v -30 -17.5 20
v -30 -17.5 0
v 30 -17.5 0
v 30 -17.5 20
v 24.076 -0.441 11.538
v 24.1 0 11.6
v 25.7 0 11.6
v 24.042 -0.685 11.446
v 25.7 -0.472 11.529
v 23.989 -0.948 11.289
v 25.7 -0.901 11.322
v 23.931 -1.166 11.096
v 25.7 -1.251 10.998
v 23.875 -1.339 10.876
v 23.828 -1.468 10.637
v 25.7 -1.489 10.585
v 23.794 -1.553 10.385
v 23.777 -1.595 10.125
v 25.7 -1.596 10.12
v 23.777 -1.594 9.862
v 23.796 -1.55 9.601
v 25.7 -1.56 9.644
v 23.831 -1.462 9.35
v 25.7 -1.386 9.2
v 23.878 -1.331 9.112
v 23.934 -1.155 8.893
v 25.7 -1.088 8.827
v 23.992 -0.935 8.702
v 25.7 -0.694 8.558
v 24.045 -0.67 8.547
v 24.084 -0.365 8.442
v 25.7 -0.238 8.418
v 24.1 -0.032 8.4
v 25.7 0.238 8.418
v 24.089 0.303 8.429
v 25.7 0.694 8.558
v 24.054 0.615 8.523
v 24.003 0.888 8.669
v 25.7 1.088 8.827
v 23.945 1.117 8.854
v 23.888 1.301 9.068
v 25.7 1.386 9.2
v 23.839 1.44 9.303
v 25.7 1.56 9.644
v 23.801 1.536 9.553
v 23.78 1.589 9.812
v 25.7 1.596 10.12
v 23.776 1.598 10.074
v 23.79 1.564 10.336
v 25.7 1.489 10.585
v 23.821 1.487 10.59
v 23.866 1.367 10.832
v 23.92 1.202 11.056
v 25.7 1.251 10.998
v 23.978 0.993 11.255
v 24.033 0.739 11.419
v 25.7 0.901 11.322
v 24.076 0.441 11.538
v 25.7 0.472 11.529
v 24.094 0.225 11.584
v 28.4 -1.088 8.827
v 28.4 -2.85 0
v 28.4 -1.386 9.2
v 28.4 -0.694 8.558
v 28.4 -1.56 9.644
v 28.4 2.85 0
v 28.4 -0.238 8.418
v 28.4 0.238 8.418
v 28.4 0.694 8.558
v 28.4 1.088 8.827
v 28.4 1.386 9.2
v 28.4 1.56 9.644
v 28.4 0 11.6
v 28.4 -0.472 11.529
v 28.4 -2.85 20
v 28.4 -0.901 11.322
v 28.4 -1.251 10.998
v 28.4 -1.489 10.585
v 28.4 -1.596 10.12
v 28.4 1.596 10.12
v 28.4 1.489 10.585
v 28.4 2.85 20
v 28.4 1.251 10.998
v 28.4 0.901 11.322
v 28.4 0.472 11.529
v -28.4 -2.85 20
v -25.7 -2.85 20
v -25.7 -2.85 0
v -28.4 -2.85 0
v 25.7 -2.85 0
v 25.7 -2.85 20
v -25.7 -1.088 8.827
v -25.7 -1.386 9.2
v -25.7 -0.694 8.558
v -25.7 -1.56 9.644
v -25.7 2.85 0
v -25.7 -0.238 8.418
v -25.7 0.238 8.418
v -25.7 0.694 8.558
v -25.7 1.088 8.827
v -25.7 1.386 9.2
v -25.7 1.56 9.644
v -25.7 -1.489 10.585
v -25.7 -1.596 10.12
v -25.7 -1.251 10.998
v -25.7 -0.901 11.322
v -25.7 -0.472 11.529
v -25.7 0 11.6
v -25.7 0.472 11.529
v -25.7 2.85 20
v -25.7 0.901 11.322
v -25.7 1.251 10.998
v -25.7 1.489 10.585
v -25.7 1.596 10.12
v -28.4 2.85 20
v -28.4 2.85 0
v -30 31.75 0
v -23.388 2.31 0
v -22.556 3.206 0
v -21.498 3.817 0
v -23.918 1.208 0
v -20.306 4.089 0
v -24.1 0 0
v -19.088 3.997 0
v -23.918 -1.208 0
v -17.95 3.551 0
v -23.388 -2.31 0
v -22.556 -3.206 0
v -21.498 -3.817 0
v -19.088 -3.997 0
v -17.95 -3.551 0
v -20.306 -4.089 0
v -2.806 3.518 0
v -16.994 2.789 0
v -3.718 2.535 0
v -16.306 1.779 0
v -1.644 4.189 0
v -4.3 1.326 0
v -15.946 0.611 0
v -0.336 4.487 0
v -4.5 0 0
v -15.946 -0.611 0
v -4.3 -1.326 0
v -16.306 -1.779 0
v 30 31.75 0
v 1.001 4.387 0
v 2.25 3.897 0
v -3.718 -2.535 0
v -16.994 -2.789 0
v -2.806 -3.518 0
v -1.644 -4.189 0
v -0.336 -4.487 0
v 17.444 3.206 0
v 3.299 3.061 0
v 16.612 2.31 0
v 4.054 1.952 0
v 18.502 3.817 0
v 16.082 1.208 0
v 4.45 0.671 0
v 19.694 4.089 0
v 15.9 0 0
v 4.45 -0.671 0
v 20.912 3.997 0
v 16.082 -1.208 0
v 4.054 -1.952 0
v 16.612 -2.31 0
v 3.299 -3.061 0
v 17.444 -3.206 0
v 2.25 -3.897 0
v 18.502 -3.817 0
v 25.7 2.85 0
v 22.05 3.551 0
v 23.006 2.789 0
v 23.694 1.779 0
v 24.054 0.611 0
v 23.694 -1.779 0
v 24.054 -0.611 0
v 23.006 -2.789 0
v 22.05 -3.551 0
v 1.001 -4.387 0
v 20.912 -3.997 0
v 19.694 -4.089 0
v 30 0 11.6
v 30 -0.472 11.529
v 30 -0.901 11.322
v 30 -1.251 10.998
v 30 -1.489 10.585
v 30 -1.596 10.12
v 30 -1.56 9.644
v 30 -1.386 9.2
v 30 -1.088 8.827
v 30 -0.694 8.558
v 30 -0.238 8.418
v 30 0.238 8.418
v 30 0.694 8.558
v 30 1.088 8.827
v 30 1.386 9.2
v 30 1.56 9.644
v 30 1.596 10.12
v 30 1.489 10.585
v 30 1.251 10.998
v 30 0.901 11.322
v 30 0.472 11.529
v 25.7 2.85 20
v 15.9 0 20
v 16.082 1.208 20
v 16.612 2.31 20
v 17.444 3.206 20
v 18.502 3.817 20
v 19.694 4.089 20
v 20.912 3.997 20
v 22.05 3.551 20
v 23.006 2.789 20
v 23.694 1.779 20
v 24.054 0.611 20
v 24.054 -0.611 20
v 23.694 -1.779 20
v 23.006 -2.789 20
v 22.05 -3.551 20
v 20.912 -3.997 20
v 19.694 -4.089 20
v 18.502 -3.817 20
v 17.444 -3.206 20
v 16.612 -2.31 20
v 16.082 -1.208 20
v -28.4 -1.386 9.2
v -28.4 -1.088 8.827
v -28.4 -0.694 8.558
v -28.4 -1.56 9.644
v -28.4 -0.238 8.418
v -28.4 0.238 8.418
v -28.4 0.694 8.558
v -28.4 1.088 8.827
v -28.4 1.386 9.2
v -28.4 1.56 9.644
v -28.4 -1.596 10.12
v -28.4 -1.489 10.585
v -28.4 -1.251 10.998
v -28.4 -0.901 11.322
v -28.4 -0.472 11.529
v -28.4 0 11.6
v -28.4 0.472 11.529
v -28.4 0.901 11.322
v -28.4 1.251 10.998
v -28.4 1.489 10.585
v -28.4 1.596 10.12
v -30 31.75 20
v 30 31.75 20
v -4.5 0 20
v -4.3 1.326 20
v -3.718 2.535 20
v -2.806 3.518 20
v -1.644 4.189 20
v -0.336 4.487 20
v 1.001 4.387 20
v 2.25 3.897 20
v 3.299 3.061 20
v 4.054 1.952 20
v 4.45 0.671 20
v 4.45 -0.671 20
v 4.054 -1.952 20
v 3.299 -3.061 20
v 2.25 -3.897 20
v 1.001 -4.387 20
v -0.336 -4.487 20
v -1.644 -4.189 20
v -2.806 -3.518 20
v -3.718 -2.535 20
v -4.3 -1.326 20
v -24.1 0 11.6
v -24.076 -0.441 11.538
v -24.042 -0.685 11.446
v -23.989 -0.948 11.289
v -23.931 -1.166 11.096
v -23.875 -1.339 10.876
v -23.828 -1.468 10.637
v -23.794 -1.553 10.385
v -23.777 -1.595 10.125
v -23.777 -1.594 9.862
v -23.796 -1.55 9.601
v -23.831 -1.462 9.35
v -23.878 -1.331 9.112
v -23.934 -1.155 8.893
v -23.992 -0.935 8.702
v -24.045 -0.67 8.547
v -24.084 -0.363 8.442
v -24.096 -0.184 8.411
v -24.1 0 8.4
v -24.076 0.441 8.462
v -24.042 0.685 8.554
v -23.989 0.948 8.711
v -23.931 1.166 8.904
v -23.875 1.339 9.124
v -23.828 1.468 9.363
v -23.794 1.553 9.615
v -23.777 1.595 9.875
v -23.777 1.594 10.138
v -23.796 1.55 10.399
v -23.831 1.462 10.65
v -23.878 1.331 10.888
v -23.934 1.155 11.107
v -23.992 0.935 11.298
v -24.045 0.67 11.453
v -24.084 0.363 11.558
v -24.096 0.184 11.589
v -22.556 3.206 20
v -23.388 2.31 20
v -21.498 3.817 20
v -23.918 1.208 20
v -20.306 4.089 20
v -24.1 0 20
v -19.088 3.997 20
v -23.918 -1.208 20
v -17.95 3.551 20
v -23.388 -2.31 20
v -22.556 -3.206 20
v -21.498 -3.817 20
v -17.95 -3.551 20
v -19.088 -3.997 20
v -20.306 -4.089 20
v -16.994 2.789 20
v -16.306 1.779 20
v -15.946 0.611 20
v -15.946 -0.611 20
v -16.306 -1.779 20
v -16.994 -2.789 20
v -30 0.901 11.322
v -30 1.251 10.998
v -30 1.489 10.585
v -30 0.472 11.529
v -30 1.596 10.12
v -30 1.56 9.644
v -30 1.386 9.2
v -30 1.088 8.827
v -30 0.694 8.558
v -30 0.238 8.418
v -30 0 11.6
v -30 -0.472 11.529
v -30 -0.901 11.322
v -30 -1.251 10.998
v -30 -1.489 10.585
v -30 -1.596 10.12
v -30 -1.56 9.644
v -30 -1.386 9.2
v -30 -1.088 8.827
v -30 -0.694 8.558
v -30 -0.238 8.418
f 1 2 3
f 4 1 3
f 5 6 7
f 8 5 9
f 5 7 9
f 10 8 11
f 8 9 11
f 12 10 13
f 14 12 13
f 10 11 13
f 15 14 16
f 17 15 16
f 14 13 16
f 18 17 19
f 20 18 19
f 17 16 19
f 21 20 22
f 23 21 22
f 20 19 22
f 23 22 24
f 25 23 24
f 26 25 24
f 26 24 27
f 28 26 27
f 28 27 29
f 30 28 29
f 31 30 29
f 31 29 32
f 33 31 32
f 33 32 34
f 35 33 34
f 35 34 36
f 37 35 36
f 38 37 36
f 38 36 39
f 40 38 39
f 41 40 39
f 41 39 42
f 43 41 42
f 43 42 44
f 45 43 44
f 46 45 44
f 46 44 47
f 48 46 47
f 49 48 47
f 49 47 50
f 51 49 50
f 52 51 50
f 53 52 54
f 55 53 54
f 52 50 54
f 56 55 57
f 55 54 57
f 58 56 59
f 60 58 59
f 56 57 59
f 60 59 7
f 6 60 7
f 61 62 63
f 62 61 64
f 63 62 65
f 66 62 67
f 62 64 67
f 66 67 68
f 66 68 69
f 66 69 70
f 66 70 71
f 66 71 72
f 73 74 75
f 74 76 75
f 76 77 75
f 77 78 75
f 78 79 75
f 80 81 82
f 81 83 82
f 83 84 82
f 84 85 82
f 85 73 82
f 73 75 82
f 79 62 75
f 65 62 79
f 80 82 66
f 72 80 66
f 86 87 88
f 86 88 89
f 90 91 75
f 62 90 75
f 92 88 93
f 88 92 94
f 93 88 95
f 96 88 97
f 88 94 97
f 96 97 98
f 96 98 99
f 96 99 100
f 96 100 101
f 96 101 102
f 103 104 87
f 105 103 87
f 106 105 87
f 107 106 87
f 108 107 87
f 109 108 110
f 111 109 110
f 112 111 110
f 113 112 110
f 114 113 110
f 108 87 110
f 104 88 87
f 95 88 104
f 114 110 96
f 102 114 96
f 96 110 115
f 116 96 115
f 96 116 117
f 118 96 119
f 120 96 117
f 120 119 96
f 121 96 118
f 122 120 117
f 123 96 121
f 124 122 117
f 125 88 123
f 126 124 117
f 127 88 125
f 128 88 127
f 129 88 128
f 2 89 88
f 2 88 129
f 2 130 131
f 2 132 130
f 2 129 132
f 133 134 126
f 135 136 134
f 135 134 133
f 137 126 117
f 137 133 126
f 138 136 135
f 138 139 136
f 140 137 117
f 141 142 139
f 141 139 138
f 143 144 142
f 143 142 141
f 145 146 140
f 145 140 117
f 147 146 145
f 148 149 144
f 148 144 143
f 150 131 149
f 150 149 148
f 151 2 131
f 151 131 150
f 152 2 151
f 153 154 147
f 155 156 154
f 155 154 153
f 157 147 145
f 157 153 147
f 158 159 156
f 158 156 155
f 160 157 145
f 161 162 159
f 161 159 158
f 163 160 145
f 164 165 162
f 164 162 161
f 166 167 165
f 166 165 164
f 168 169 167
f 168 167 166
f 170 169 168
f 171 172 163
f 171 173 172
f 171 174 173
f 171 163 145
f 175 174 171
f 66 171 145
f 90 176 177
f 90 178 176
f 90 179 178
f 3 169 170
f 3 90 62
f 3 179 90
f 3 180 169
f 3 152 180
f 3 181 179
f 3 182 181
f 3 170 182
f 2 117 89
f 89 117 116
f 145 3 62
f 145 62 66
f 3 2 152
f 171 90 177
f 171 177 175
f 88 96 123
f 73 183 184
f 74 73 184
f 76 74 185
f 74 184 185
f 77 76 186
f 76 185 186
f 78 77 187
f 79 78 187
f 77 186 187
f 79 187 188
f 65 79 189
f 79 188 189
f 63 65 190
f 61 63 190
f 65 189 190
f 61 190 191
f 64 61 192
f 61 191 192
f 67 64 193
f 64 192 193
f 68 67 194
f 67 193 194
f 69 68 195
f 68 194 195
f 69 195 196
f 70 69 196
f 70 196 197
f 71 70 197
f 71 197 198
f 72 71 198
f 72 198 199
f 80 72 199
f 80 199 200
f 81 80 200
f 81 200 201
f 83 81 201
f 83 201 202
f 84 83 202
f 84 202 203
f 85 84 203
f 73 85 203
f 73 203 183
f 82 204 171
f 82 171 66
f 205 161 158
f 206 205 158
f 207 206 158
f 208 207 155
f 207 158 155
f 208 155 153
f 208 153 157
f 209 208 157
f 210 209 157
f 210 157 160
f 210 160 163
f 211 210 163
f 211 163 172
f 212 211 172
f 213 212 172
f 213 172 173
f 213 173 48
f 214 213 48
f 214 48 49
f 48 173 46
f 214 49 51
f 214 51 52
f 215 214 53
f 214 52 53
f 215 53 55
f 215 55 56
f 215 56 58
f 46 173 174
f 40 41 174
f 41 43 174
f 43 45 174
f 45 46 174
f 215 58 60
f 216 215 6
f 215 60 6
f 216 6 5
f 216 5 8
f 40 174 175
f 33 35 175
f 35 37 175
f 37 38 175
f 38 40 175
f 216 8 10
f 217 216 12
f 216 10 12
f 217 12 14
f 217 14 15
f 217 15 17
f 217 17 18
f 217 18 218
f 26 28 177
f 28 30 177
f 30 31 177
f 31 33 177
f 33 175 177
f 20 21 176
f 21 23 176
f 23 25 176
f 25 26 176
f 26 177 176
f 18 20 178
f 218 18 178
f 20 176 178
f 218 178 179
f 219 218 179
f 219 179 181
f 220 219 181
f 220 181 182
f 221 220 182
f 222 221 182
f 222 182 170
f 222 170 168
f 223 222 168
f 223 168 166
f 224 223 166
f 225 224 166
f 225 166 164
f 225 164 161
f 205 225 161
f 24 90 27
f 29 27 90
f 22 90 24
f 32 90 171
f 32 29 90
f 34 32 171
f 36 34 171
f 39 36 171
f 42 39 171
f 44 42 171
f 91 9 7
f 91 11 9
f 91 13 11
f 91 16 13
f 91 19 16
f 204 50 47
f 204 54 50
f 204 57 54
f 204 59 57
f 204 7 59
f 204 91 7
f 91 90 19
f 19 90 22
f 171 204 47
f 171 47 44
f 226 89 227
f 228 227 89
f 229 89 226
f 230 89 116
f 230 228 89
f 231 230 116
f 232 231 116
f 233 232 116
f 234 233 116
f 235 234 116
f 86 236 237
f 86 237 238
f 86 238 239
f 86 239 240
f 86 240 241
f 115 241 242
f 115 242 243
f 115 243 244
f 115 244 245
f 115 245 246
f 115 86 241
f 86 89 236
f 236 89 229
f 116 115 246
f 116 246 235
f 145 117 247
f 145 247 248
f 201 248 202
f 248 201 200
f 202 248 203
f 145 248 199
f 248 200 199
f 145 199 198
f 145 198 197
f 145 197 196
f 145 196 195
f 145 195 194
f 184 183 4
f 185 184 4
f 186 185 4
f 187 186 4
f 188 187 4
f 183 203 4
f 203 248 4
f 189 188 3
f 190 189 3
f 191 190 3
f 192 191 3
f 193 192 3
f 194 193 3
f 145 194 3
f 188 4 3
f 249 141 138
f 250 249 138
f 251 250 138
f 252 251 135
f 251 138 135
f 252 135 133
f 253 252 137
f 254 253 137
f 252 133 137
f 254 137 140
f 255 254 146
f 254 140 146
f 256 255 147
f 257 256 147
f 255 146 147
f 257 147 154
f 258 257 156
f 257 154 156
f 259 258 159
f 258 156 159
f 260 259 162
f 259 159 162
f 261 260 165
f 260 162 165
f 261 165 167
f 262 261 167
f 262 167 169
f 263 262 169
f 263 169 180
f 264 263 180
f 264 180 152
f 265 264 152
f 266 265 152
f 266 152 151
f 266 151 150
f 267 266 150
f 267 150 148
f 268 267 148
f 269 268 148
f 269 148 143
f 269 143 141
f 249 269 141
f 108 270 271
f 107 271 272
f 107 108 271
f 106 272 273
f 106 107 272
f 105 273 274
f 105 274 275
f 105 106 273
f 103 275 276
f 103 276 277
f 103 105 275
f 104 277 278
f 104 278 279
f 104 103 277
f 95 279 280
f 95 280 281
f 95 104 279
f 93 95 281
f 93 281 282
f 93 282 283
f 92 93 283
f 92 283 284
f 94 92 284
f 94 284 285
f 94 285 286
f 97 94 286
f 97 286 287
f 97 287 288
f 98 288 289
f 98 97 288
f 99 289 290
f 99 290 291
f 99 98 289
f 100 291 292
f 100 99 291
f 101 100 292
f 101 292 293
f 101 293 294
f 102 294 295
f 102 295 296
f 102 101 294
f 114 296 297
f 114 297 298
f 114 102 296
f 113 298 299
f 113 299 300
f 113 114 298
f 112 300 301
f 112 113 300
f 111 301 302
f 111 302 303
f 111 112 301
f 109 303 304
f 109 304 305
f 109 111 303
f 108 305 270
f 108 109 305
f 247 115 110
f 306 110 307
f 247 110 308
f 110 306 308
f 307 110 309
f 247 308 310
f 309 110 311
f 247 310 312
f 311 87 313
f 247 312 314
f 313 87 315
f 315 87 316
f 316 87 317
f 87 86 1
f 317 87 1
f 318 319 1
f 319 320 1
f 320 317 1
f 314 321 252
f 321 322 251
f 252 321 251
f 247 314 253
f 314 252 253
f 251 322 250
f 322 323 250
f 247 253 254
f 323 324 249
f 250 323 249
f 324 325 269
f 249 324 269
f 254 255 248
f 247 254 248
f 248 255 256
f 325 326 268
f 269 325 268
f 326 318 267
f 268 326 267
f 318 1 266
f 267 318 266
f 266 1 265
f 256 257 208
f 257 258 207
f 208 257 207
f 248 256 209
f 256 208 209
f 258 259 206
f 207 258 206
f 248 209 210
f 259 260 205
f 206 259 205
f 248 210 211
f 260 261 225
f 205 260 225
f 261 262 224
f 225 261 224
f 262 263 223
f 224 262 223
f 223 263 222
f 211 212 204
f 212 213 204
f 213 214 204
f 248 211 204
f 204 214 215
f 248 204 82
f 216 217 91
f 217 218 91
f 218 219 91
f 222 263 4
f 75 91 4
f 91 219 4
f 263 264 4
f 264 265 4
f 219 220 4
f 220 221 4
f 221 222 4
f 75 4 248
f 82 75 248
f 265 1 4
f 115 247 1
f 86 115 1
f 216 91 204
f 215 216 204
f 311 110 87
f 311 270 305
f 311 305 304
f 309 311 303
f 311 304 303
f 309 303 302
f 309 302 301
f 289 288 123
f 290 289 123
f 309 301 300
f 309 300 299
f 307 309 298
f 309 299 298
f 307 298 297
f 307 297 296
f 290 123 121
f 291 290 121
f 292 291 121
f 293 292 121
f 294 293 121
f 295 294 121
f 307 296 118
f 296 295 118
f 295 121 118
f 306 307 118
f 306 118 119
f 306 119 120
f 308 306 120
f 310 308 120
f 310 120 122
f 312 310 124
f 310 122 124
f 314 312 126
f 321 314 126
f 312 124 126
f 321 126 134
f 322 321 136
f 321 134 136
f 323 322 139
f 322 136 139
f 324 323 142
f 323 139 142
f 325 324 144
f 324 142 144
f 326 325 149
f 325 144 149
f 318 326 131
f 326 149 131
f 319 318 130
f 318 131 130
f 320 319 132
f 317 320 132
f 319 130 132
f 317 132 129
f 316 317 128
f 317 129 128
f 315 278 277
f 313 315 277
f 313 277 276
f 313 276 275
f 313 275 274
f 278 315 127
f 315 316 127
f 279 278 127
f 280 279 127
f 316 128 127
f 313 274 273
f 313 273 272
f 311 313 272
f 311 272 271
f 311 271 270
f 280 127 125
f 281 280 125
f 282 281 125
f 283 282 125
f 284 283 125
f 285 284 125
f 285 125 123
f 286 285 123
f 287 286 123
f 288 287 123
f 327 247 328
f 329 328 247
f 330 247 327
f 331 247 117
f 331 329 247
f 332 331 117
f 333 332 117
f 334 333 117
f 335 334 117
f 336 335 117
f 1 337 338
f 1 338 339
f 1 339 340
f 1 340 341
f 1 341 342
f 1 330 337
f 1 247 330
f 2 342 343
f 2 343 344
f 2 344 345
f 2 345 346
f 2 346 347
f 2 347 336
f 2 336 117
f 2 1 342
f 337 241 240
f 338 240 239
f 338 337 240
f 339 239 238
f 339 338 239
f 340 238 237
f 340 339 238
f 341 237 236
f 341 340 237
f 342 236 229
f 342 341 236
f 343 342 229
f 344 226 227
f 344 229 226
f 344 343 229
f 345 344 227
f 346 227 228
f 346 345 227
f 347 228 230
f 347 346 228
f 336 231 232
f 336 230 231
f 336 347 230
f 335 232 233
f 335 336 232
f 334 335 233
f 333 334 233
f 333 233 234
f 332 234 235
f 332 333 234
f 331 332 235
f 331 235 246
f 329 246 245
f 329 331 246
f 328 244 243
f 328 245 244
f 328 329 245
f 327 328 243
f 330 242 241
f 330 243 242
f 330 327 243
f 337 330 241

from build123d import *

# Parameters (mm, degrees)
SKETCH_1_W          = 60
SKETCH_1_H          = 35
EXTRUDE_1_DEPTH     = 20
HOLE_WIZARD_356_D   = 9
HOLE_WIZARD_461_D   = 8.2
SKETCH_8_W          = 2.7
SKETCH_8_H          = 5.7
CUT_EXTRUDE_1_DEPTH = 41.078048855
SKETCH_9_R          = 1.6
CUT_EXTRUDE_2_DEPTH = 10
SKETCH_10_W         = 60
SKETCH_10_H         = 20
EXTRUDE_2_DEPTH     = 14.25


with BuildPart() as part:
    # 草图1 → 凸台-拉伸1 (new body)
    with BuildSketch(Plane.XY):
        Rectangle(SKETCH_1_W, SKETCH_1_H)
    extrude(amount=EXTRUDE_1_DEPTH)

    # Hole Wizard 356 (through all)
    with Locations(Plane.XY.offset(20)):
        with Locations((0, 0)):
            Hole(HOLE_WIZARD_356_D / 2)

    # Hole Wizard 461 (through all)
    with Locations(Plane.XY.offset(20)):
        with Locations((20, 0), (-20, 0)):
            Hole(HOLE_WIZARD_461_D / 2)

    # 草图8 → 切除-拉伸1 (cut, through all)
    with BuildSketch(Plane.XY.offset(20)):
        with Locations((27.05, 0)):
            Rectangle(SKETCH_8_W, SKETCH_8_H)
    cut_extrude_1 = extrude(amount=-CUT_EXTRUDE_1_DEPTH, mode=Mode.SUBTRACT)

    # 草图9 → 切除-拉伸2 (cut)
    with BuildSketch(Plane(origin=(30, 0, 0), x_dir=(0, 0, -1), z_dir=(1, 0, 0))):
        with Locations(Location((-10, 0, 0), (0, 0, 180))):
            Circle(SKETCH_9_R)
    cut_extrude_2 = extrude(amount=-CUT_EXTRUDE_2_DEPTH, mode=Mode.SUBTRACT)

    # 镜向1: 切除-拉伸1, 切除-拉伸2 across plane
    add(cut_extrude_1.mirror(Plane(origin=(0, 0, 0), x_dir=(0, 0, 1), z_dir=(1, 0, 0))), mode=Mode.SUBTRACT)
    add(cut_extrude_2.mirror(Plane(origin=(0, 0, 0), x_dir=(0, 0, 1), z_dir=(1, 0, 0))), mode=Mode.SUBTRACT)

    # 草图10 → 凸台-拉伸2 (add)
    with BuildSketch(Plane(origin=(0, 17.5, 0), x_dir=(1, 0, 0), z_dir=(0, 1, 0))):
        with Locations((0, -10)):
            Rectangle(SKETCH_10_W, SKETCH_10_H)
    extrude(amount=EXTRUDE_2_DEPTH)


solid = part.part
